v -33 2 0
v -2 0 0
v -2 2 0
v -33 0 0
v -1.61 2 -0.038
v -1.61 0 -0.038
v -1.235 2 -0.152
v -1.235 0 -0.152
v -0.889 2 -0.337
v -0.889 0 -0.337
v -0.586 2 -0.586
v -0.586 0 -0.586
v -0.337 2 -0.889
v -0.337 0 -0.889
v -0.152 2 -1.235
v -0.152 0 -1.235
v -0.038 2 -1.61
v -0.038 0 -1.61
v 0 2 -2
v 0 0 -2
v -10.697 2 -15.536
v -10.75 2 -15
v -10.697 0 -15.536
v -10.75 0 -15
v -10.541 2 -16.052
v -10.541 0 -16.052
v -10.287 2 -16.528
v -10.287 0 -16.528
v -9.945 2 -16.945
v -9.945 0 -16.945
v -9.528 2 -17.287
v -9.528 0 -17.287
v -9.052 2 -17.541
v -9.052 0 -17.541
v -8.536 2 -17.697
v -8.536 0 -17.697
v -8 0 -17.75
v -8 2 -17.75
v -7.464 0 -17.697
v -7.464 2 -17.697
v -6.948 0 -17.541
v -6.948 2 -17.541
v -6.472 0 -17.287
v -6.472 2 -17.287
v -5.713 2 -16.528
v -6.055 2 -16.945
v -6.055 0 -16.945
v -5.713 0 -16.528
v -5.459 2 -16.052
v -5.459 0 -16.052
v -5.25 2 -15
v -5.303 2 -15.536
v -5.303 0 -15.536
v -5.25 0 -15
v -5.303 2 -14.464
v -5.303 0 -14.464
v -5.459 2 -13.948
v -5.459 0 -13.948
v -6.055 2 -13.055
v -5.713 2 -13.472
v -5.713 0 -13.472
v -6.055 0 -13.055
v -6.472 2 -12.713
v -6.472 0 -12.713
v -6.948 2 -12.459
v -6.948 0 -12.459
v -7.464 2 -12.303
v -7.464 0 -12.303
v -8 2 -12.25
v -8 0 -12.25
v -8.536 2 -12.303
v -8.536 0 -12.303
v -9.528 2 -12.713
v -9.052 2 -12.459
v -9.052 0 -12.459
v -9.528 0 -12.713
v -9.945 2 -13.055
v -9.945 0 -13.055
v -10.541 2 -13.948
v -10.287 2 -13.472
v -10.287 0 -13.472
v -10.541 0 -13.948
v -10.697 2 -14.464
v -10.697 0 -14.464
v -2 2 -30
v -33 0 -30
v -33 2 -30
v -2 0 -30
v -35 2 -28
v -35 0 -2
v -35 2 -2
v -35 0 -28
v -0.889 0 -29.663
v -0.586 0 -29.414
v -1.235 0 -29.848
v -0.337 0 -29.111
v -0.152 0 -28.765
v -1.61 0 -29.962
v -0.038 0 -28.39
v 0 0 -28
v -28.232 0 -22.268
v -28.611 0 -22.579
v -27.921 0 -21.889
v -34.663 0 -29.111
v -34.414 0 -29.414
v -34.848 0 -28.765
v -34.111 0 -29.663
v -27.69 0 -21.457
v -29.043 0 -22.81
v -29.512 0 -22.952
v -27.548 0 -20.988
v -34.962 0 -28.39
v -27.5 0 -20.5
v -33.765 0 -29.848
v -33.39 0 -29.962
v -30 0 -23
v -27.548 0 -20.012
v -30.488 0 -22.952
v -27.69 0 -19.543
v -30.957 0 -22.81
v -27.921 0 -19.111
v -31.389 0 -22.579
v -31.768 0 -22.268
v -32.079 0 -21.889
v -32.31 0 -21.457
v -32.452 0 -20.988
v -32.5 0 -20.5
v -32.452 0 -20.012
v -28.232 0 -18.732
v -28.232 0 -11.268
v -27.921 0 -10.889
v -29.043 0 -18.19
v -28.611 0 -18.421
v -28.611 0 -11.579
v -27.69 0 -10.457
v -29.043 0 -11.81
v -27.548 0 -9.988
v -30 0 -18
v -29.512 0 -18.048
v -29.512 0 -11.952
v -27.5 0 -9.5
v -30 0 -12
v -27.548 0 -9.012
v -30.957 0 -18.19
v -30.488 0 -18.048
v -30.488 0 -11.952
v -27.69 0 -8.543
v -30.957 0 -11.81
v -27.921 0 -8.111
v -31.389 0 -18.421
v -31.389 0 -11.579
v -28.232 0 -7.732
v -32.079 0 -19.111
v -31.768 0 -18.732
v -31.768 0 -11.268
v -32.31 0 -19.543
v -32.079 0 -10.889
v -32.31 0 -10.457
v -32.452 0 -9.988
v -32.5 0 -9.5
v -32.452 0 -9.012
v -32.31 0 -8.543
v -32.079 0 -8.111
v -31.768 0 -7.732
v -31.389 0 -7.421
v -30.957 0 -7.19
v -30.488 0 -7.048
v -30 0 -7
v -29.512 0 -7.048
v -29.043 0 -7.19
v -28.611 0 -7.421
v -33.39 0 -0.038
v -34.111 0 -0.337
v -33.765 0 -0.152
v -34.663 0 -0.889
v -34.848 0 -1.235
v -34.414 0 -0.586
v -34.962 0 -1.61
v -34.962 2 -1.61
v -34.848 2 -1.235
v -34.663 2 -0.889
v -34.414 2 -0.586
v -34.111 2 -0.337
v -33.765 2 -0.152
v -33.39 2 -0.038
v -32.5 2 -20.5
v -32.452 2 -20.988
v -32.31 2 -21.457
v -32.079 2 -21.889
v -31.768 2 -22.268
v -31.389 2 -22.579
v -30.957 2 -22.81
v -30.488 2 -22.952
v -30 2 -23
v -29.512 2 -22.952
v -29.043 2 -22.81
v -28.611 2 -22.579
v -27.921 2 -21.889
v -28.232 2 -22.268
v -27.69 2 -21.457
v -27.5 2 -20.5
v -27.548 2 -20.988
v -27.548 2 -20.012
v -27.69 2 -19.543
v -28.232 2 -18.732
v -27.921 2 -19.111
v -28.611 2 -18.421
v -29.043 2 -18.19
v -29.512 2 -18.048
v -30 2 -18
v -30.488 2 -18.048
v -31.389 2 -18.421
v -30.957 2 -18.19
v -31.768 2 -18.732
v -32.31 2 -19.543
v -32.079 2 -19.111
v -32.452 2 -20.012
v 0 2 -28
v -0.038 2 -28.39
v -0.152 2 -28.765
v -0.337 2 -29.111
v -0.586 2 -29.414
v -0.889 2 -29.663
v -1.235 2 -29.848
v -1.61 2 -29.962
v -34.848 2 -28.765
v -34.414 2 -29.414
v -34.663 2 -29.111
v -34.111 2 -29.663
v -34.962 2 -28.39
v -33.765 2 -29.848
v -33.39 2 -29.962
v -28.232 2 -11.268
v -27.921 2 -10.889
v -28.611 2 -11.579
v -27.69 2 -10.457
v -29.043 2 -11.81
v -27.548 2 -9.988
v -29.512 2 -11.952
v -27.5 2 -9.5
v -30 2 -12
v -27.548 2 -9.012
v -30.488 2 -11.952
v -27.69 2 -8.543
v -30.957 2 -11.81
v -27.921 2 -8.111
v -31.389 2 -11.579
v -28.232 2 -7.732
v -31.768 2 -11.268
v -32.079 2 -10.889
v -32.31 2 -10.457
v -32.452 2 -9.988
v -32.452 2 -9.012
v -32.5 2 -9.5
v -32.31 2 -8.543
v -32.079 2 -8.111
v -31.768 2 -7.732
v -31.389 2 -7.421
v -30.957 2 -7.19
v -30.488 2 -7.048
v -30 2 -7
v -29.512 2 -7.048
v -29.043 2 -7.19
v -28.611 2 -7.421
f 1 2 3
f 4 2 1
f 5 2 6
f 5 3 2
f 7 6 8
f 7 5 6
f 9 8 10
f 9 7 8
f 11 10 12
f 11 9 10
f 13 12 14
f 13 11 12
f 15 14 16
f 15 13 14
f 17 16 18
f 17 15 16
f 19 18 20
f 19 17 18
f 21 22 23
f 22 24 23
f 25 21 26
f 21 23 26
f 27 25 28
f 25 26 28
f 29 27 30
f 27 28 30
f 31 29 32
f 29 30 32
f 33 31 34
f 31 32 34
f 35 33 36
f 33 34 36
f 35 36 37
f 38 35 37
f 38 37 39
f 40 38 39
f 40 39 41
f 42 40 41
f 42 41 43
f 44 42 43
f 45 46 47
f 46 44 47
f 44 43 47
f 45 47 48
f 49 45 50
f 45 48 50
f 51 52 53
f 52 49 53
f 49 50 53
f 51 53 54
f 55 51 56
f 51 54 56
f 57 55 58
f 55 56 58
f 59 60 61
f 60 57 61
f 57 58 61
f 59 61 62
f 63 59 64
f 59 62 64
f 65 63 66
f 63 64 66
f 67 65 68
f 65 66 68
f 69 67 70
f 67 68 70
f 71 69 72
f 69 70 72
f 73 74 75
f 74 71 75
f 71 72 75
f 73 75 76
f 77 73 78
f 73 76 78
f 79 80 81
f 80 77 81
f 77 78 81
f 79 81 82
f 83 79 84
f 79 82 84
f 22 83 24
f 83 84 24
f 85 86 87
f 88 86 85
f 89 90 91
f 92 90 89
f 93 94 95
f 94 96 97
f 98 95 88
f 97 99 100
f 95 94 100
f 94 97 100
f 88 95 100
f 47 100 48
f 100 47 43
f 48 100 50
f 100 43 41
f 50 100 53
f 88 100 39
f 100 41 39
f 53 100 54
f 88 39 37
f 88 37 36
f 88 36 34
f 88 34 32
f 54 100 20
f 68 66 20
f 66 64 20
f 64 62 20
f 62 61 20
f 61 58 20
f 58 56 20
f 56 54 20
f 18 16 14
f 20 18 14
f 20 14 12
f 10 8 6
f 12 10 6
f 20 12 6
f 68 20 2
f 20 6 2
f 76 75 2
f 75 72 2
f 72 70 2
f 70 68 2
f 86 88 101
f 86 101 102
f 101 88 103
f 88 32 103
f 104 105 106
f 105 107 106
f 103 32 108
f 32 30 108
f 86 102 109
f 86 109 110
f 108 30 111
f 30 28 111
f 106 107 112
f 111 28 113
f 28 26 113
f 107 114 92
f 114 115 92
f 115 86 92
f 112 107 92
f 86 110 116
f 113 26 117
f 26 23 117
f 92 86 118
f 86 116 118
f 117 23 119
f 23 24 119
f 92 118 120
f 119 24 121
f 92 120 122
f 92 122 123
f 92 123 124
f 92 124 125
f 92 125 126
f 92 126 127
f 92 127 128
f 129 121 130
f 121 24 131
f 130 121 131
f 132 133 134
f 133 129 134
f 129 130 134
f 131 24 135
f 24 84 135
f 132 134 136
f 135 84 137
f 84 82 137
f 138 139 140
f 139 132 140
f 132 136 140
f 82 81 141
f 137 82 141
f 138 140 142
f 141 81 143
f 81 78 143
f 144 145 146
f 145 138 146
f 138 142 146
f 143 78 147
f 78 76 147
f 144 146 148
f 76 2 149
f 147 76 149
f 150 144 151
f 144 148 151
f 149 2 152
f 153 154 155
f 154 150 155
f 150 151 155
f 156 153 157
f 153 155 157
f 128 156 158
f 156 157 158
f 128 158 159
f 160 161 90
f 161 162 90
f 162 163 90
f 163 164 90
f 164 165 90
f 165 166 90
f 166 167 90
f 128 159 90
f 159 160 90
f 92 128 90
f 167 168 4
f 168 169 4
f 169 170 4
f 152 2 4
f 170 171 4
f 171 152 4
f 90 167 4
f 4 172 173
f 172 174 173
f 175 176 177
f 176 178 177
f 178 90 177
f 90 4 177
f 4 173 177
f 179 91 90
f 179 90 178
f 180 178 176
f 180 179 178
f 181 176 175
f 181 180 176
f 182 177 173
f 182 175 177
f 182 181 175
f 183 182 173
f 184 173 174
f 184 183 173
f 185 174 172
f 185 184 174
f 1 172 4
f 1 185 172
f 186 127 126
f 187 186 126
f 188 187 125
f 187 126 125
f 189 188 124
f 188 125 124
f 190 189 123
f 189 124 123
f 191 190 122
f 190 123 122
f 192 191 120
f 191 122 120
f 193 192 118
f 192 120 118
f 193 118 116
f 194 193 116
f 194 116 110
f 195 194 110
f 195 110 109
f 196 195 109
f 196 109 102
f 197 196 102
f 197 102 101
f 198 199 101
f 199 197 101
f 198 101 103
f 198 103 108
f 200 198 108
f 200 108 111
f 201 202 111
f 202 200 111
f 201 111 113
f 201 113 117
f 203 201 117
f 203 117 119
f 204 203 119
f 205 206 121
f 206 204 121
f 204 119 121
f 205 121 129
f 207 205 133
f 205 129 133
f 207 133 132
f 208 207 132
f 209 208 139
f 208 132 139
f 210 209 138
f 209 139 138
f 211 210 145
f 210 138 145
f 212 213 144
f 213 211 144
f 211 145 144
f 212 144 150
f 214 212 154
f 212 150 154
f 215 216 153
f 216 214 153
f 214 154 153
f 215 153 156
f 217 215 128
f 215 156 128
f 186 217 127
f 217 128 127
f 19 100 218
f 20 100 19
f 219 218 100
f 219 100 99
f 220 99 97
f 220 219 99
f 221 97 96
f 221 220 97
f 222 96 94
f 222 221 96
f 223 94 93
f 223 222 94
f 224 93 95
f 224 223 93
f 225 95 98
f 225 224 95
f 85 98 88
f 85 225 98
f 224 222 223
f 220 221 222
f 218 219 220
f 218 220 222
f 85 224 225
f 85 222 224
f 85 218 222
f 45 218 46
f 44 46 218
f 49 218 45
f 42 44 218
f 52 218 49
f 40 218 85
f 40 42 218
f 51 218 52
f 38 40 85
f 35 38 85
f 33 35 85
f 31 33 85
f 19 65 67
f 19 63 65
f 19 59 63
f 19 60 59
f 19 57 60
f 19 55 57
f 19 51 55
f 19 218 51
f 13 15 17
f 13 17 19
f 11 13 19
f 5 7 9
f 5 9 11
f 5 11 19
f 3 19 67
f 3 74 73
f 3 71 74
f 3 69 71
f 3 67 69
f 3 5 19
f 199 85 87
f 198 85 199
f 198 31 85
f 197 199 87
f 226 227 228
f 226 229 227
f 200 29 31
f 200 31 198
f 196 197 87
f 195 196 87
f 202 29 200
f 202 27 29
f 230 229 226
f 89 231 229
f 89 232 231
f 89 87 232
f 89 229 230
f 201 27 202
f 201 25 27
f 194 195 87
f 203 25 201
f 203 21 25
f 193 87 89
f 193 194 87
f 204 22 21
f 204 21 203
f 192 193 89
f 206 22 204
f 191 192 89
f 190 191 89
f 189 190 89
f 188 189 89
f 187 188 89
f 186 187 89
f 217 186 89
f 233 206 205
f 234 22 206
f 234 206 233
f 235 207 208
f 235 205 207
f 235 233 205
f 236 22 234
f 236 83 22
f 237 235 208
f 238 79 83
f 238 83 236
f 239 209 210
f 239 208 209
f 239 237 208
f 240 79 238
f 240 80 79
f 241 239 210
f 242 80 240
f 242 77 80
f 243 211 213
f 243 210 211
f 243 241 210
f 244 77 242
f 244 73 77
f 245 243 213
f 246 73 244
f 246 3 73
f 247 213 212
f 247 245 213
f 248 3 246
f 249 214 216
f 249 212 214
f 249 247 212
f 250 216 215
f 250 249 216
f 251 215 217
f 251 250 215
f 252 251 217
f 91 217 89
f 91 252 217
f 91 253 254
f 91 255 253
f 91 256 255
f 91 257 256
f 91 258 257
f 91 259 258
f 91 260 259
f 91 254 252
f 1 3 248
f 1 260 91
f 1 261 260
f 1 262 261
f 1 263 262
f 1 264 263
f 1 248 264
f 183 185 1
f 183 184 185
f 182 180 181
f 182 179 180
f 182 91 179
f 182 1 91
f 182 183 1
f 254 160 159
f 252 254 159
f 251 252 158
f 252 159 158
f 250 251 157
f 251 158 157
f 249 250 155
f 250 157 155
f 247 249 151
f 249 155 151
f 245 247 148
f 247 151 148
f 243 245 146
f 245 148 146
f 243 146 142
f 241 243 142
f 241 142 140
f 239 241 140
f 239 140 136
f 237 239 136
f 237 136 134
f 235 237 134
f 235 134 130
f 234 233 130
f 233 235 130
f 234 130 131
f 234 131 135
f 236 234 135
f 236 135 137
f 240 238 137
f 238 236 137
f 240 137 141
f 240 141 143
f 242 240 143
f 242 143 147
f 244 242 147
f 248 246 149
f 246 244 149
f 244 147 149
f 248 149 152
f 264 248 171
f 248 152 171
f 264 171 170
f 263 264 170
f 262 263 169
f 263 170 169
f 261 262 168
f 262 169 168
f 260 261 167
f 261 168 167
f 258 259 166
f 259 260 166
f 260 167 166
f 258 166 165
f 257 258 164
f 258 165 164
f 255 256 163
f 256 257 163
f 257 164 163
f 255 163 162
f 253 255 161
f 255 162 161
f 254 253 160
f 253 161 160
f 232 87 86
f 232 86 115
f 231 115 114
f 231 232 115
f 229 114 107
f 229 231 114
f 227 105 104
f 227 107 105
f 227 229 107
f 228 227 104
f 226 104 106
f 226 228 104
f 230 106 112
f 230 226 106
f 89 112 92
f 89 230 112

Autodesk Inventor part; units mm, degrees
ref_plane "YZ Plane" through (0, 0, 0) normal (1, 0, 0) x (0, 1, 0)
ref_plane "XZ Plane" through (0, 0, 0) normal (0, 1, 0) x (-1, 0, 0)
ref_plane "XY Plane" through (0, 0, 0) normal (0, 0, 1) x (1, 0, 0)
sketch "Sketch1" plane through (0, 0, 0) normal (0, 1, 0) x (-1, 0, 0)
  line L0 (0, 0) -> (35, 0)
  line L1 (35, 0) -> (35, -30)
  line L2 (35, -30) -> (0, -30)
  line L3 (0, -30) -> (0, 0)
  circle A0 centre (30, -9.5) radius 2.5
  circle A1 centre (30, -20.5) radius 2.5
  line L4 (30, -9.5) -> (30, -20.5) construction
  circle A2 centre (8, -15) radius 2.75
  point P0 (35, -15)
  point P1 (30, -15)
  point P2 (0, -15)
  dimension "d0" = 30
  dimension "d1" = 35
  dimension "d2" = 5
  dimension "d3" = 5
  dimension "d4" = 11
  dimension "d5" = 5
  dimension "d6" = 5.5
  dimension "d7" = 8
extrude "Extrusion1" add sketch "Sketch1" along normal blind 2
fillet "Fillet1" radius 2 4 edges at (0, 1, -30) (0, 1, 0) (-35, 1, 0) (-35, 1, -30)
equation "\"d3\" = d2"
